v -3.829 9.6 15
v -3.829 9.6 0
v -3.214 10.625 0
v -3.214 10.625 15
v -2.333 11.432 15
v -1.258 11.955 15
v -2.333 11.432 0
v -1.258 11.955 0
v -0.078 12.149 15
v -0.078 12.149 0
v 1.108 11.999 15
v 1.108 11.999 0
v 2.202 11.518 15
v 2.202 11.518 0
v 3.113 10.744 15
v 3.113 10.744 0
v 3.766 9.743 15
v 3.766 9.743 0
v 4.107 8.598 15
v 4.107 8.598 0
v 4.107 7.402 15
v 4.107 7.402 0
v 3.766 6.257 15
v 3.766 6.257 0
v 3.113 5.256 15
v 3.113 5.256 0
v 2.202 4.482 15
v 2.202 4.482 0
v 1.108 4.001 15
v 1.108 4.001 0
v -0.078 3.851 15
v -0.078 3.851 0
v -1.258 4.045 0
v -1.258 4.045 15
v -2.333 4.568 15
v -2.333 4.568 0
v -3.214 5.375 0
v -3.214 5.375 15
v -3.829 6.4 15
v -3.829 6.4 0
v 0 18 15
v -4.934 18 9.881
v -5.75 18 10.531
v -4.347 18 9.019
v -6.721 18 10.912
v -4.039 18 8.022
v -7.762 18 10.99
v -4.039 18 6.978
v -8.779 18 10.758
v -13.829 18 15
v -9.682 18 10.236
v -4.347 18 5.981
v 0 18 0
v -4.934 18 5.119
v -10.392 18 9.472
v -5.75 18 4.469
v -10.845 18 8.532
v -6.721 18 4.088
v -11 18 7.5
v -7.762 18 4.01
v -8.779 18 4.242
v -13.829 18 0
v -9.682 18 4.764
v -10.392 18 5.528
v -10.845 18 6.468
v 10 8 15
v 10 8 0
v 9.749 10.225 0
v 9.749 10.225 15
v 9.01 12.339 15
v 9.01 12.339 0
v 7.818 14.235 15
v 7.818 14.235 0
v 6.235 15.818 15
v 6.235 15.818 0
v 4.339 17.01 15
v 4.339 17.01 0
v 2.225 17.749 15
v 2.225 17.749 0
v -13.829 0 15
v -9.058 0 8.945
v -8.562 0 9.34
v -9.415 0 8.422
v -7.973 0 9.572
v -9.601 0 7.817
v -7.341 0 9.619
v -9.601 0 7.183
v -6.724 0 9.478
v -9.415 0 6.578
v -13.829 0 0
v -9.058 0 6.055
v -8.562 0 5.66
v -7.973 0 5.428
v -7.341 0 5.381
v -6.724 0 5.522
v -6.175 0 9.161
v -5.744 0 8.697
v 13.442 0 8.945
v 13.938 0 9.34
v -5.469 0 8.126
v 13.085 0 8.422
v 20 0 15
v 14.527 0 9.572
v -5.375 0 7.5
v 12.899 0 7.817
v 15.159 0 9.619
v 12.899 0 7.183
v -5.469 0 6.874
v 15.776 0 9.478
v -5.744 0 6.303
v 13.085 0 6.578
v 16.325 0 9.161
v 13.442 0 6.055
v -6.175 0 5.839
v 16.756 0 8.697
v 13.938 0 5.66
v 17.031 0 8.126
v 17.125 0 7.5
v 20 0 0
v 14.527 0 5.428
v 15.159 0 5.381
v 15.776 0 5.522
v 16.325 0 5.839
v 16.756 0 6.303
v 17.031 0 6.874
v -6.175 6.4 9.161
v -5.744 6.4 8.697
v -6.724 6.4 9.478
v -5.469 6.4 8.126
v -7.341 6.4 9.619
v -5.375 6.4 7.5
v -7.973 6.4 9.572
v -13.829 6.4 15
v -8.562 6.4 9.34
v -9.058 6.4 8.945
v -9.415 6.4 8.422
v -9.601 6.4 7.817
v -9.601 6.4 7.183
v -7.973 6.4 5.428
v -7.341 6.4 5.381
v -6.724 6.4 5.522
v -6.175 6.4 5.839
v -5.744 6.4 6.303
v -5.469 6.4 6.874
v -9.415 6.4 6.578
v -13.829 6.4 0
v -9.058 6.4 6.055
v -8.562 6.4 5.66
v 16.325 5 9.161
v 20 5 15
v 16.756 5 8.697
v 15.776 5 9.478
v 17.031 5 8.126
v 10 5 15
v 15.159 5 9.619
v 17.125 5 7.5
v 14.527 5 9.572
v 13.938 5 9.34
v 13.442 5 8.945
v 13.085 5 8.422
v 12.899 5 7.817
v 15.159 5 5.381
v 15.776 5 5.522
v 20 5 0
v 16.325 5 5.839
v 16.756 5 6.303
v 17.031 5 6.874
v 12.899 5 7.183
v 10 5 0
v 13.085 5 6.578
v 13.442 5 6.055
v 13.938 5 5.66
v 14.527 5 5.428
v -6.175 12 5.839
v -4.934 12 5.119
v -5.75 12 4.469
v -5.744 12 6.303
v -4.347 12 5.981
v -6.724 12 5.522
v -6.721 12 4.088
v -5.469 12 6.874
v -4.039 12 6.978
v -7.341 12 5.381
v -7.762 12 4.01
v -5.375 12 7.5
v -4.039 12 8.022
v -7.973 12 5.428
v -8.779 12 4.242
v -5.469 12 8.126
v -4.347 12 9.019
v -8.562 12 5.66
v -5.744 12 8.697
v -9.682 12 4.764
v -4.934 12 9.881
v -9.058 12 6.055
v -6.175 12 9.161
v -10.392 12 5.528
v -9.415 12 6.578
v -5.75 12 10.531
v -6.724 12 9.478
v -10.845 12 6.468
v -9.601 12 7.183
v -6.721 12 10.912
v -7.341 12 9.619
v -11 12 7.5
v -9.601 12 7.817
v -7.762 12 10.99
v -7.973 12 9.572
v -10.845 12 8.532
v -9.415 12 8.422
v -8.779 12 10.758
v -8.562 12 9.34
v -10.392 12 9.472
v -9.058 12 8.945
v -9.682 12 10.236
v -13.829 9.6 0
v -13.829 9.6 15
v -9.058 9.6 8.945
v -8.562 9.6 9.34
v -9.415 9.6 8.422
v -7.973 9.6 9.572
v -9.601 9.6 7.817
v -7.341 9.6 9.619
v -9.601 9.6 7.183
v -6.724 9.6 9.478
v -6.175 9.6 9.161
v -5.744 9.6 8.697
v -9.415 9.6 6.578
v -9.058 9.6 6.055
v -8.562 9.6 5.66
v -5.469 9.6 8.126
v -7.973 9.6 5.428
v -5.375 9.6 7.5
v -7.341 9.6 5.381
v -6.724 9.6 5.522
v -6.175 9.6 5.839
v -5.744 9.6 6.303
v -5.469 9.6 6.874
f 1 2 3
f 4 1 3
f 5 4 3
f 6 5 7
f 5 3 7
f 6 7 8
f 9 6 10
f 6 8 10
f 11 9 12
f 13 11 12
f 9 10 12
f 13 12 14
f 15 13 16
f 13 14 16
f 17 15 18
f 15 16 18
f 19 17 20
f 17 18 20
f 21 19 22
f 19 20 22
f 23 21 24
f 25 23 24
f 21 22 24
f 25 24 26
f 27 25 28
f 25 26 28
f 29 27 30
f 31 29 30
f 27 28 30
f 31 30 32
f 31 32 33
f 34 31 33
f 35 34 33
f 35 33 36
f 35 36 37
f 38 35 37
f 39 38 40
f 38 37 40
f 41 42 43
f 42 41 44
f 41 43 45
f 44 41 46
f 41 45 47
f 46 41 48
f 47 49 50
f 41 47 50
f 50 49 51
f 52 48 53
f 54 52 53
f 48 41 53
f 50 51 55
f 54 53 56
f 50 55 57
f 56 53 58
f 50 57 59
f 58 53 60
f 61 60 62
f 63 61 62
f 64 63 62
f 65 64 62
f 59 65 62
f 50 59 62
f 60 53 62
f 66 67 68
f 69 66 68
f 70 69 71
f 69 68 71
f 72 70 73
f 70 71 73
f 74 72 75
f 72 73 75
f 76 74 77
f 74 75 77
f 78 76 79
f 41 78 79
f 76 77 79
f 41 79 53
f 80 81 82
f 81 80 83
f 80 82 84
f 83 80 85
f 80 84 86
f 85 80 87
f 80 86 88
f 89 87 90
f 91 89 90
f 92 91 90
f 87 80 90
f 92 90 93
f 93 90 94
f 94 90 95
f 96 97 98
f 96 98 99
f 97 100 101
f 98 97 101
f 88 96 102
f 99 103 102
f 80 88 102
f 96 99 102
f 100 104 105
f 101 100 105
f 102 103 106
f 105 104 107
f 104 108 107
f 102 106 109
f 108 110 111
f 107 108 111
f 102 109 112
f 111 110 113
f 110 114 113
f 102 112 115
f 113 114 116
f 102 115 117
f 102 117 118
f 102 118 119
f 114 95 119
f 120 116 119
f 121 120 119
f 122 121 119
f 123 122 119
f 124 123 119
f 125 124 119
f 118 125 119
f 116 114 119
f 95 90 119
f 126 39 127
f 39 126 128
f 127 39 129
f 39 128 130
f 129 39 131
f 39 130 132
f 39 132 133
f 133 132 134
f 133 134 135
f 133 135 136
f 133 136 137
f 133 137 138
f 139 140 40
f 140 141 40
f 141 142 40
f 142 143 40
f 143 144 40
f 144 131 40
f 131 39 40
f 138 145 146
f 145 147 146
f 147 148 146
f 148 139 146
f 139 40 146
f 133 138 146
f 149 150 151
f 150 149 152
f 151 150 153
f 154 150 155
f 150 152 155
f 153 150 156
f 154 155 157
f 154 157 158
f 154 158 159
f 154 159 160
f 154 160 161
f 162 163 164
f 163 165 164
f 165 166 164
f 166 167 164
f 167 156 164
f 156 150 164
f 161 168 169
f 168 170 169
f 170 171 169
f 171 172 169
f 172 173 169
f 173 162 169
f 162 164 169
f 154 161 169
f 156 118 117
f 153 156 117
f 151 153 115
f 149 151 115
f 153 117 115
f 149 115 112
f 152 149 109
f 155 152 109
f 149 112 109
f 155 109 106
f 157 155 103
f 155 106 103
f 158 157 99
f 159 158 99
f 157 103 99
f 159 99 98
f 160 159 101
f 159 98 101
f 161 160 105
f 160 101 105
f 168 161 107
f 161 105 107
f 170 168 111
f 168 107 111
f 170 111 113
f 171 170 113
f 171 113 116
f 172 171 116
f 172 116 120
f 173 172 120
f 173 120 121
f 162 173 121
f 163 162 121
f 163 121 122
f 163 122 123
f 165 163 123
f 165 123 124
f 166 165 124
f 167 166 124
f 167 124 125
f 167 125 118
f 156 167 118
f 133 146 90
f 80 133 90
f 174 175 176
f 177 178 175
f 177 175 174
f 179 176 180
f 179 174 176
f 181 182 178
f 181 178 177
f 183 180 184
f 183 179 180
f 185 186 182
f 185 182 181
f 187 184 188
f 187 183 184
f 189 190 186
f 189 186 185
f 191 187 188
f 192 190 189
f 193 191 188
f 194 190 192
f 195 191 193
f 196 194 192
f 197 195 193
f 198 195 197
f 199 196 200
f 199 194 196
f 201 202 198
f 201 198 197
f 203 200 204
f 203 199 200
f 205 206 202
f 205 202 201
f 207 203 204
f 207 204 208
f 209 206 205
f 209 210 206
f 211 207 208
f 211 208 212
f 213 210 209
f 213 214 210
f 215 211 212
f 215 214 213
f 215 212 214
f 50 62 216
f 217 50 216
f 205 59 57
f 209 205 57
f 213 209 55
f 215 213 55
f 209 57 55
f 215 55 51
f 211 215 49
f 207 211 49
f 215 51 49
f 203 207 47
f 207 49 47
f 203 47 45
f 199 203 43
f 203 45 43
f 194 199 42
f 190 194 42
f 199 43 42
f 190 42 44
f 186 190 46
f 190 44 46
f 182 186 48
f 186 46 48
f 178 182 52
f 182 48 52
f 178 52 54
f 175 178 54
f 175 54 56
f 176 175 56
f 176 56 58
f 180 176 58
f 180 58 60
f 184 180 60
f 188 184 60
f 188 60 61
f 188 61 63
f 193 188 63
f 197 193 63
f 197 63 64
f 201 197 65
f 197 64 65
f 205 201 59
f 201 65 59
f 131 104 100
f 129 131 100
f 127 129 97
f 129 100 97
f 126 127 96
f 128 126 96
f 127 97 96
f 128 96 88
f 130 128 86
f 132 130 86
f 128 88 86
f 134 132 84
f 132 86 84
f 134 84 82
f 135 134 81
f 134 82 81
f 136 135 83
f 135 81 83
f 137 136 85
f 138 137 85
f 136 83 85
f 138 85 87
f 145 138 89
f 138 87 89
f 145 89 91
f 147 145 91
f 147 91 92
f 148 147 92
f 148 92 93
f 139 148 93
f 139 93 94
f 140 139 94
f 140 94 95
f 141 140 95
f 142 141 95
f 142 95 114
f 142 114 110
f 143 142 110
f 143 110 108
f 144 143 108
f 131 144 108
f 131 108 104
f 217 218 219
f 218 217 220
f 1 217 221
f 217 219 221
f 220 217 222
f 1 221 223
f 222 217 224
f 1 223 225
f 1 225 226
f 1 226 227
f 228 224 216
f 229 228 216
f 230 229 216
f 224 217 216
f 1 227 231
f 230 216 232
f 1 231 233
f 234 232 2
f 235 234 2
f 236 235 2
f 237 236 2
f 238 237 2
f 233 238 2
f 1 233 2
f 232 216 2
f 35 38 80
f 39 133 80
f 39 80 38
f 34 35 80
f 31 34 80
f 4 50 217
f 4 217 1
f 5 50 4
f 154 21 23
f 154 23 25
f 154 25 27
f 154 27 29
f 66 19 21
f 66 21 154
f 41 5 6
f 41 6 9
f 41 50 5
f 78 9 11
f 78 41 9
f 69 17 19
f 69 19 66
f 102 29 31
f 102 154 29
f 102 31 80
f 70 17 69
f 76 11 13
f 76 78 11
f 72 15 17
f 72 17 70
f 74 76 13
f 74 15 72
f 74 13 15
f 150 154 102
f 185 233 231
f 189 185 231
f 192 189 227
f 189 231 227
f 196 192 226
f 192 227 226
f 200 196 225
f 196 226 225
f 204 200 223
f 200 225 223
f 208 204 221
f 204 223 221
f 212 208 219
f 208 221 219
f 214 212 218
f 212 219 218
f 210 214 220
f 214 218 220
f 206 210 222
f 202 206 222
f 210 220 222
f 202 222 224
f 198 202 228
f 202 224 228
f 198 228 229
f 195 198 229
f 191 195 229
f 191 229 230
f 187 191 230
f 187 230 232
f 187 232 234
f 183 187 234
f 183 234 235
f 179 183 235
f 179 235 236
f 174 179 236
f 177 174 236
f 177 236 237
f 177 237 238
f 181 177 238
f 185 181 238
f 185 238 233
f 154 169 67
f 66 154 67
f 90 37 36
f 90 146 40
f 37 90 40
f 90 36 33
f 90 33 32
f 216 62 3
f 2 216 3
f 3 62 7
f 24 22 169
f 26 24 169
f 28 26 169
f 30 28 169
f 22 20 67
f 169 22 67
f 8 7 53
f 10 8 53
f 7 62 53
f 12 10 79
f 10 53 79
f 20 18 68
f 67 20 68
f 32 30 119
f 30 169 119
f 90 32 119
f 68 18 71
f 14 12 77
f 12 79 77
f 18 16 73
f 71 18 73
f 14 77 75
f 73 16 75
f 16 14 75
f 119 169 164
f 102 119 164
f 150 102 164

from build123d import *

# Parameters (mm, degrees)
F1_DEPTH = 15
F2_R     = 2.125
F3_DEPTH = 18.001
F4_R     = 3.5
F5_DEPTH = 6


with BuildPart() as f1:
    # F0 (on Top) → F1 (new body)
    with BuildSketch(Plane.XY):
        with BuildLine():
            Line((-13.829164, 6.4), (-13.829164, 0))
            Line((-13.829164, 0), (20, 0))
            Line((20, 0), (20, 5))
            Line((20, 5), (10, 5))
            Line((10, 5), (10, 8))
            ThreePointArc((10, 8), (7.071068, 15.071068), (0, 18))
            Line((0, 18), (-13.829164, 18))
            Line((-13.829164, 18), (-13.829164, 9.6))
            Line((-13.829164, 9.6), (-3.829164, 9.6))
            ThreePointArc((-3.829164, 9.6), (4.15, 8), (-3.829164, 6.4))
            Line((-3.829164, 6.4), (-13.829164, 6.4))
        make_face()
    extrude(amount=F1_DEPTH)

    # F2 (on face) → F3 (cut, through all)
    with BuildSketch(Plane.XZ):
        with Locations((-7.5, 7.5)):
            Circle(F2_R)
        with Locations((15, 7.5)):
            Circle(F2_R)
    extrude(amount=-F3_DEPTH, mode=Mode.SUBTRACT)

    # F4 (on face) → F5 (cut)
    with BuildSketch(Plane(origin=(0, 18, 0), x_dir=(-1, 0, 0), z_dir=(0, 1, 0))):
        with Locations((7.5, 7.5)):
            Circle(F4_R)
    extrude(amount=-F5_DEPTH, mode=Mode.SUBTRACT)


solid = f1.part
